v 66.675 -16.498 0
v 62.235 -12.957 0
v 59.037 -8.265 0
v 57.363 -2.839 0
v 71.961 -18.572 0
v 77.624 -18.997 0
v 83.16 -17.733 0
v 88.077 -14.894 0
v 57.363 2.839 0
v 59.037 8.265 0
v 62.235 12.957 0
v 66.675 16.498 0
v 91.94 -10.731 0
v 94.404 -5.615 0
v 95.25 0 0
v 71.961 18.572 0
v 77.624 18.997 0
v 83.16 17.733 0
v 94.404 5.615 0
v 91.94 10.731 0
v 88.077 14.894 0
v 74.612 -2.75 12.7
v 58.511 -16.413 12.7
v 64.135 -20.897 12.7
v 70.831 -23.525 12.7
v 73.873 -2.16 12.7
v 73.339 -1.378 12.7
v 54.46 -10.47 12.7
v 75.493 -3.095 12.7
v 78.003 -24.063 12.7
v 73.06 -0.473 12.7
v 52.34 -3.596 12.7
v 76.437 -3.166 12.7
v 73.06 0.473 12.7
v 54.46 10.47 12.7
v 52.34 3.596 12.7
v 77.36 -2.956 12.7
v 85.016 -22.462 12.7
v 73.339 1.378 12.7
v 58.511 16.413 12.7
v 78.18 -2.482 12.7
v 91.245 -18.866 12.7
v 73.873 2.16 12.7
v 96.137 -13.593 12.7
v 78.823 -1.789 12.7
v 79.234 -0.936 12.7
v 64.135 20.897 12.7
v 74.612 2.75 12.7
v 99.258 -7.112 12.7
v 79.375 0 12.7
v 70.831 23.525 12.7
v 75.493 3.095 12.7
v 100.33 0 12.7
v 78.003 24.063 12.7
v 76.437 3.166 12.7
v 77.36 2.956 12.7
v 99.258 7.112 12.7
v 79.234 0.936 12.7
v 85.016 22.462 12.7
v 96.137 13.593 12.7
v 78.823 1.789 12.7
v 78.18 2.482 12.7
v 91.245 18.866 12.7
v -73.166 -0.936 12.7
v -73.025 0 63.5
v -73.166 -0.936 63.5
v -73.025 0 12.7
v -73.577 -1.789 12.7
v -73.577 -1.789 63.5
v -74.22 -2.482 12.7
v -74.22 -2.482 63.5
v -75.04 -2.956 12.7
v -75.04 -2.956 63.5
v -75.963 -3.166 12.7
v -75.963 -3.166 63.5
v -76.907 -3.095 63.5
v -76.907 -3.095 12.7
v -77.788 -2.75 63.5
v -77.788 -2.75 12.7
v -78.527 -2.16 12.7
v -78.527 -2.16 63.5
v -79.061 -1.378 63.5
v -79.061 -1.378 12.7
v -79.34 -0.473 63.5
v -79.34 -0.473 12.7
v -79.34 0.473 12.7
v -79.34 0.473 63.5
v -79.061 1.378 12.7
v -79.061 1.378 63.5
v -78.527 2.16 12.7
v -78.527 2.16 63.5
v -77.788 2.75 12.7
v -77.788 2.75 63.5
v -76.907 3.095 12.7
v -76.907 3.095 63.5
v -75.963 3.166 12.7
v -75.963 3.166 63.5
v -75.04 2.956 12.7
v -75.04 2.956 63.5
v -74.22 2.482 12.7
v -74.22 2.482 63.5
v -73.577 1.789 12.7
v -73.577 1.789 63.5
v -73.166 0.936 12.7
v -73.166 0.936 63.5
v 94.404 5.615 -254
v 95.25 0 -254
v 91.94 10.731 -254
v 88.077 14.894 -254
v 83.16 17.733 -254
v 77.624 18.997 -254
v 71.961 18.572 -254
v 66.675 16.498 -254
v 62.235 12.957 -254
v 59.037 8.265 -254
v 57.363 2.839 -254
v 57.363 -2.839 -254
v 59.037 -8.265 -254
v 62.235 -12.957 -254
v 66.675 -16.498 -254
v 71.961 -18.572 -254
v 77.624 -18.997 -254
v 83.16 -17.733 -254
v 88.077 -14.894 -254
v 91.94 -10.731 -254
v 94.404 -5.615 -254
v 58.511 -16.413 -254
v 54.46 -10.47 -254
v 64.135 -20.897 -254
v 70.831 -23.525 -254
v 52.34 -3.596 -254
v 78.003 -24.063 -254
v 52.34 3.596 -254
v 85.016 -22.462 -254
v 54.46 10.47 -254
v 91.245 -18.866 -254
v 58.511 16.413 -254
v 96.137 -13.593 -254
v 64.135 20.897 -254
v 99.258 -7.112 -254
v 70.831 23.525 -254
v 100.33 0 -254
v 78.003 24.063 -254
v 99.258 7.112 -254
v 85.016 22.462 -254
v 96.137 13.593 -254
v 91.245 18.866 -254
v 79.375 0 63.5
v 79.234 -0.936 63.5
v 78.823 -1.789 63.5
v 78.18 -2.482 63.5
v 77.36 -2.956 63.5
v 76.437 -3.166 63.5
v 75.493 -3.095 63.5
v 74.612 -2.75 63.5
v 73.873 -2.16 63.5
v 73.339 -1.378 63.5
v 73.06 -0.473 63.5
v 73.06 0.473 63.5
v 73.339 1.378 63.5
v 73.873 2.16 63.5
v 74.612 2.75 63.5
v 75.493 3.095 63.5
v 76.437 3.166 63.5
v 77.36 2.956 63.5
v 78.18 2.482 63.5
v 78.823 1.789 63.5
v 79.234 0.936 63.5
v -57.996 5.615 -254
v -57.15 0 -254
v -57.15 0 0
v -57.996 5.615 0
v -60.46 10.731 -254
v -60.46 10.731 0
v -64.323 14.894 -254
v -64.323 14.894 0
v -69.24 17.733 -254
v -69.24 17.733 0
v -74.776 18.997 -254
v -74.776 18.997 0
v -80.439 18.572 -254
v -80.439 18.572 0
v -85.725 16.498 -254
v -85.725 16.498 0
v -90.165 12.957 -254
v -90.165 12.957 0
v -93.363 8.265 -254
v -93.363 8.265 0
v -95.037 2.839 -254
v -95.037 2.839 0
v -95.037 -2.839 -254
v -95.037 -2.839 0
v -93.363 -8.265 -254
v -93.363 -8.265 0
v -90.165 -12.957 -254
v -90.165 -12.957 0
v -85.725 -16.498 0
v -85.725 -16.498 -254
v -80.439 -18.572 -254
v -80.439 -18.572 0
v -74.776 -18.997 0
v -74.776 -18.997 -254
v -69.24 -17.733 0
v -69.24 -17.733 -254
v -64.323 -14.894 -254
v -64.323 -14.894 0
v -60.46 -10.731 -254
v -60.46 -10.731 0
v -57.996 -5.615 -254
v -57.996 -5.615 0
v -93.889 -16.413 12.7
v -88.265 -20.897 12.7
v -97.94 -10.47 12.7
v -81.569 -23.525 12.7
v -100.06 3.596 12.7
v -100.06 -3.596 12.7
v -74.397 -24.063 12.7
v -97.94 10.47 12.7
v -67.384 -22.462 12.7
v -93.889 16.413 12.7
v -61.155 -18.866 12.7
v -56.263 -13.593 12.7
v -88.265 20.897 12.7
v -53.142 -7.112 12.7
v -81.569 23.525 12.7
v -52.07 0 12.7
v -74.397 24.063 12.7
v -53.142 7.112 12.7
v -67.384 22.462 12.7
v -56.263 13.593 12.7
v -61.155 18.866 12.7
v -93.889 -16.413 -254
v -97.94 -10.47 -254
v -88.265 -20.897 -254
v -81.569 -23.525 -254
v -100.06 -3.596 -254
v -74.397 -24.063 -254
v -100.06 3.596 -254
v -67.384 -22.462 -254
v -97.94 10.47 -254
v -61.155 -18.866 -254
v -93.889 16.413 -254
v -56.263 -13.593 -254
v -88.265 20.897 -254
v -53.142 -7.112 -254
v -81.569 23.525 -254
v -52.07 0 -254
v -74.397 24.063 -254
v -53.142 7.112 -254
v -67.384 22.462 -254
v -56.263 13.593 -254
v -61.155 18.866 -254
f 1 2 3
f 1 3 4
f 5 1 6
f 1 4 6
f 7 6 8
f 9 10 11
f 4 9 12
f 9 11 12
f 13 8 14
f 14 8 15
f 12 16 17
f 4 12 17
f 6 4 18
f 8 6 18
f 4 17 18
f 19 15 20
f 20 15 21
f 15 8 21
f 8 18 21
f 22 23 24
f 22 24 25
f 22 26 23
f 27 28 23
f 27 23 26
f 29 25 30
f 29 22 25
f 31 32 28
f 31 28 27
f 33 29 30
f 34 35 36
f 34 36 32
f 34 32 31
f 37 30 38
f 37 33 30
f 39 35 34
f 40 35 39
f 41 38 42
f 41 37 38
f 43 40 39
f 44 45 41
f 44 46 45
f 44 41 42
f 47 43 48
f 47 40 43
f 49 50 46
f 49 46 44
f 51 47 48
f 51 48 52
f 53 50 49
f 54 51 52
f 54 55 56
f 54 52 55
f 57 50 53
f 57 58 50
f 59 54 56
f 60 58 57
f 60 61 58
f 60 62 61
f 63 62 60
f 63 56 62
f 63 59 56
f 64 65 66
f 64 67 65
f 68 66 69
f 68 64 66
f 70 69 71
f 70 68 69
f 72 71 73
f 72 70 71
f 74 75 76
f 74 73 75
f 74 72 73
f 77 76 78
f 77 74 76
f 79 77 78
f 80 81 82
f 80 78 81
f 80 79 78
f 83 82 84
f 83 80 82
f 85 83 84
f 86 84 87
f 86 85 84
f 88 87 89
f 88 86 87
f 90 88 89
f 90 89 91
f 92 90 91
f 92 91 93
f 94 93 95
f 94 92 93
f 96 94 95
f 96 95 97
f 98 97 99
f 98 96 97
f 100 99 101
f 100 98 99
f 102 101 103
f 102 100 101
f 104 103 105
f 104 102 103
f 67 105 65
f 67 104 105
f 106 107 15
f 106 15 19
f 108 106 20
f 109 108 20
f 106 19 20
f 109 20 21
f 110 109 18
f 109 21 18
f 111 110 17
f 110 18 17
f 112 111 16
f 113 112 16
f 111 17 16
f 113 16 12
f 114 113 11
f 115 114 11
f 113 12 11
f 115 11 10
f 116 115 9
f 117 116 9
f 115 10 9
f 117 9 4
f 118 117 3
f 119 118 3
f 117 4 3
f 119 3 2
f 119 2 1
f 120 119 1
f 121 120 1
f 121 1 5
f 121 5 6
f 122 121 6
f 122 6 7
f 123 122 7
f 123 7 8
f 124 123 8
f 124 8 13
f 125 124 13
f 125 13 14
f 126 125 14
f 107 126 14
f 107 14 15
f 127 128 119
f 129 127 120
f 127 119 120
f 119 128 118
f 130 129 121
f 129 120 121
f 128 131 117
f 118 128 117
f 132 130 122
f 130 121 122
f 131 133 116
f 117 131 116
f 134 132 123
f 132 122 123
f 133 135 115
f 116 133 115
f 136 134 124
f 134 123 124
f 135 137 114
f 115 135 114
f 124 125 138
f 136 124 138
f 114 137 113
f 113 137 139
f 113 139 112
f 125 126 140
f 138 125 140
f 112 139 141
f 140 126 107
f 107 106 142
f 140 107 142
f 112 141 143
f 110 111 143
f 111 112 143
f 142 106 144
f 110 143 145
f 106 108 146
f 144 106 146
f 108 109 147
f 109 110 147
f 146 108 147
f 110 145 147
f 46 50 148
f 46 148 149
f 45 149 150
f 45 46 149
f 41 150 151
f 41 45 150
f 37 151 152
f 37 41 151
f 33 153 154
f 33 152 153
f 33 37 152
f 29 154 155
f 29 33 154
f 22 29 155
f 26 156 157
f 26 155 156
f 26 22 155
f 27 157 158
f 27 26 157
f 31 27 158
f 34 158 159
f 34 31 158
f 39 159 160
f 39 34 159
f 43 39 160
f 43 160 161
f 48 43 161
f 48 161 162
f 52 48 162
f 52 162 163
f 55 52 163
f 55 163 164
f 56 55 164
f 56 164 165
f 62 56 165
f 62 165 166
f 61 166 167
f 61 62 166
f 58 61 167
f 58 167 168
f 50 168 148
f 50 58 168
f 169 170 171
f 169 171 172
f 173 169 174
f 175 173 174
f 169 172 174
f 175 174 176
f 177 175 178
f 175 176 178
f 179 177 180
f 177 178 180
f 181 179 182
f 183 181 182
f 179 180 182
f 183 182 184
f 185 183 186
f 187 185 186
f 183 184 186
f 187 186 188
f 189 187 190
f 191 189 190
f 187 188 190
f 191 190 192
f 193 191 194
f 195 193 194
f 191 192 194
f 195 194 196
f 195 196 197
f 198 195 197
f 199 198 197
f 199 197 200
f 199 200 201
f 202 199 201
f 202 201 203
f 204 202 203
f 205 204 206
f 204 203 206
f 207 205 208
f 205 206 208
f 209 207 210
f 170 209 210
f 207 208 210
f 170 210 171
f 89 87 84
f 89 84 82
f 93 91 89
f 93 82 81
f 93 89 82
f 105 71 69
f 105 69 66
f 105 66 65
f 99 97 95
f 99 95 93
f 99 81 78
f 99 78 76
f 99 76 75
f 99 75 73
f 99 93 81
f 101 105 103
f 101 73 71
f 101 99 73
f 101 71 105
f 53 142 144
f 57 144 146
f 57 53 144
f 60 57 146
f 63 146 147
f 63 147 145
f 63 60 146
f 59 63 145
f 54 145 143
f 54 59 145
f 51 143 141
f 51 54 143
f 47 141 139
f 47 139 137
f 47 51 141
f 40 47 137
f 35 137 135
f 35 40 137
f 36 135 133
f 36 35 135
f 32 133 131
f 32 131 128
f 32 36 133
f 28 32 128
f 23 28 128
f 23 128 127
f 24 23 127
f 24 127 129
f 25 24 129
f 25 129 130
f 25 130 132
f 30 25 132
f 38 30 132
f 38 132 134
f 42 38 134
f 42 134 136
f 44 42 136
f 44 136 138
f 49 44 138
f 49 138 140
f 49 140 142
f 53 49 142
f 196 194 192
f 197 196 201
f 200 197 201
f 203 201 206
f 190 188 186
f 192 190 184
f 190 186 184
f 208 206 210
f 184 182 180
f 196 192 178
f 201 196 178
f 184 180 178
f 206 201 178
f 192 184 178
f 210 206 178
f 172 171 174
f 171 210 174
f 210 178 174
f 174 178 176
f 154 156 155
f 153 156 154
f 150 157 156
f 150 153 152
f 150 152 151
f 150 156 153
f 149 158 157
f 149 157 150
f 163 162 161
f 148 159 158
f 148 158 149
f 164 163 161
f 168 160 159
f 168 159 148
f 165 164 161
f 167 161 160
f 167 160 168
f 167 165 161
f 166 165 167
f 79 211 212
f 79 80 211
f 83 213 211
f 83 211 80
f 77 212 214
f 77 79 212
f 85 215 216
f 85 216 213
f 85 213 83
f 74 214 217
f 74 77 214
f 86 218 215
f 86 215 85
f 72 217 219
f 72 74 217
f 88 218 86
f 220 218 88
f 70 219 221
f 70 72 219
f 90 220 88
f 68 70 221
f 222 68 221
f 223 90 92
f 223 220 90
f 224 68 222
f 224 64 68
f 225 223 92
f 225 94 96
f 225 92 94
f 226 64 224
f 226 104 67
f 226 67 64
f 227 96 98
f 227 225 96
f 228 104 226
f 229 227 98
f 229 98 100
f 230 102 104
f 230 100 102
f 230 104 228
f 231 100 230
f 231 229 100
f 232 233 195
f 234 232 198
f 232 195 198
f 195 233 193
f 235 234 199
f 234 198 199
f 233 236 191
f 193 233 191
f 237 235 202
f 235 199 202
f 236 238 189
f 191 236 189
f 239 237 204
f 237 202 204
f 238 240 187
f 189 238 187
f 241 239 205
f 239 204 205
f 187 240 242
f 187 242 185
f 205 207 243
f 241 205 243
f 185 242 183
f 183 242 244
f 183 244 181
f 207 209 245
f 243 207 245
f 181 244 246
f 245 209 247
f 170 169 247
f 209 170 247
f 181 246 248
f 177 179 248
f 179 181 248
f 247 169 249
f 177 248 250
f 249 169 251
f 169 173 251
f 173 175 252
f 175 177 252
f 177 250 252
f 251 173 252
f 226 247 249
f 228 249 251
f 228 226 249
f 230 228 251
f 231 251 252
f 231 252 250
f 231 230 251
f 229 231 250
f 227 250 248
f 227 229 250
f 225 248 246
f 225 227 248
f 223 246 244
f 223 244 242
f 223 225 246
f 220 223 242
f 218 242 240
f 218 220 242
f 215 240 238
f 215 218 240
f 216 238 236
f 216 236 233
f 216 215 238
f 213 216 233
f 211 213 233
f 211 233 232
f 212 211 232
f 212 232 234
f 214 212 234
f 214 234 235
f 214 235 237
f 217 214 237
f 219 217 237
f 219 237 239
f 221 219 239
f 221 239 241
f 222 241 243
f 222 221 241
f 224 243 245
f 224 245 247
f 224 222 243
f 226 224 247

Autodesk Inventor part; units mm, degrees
ref_plane "YZ Plane" through (0, 0, 0) normal (1, 0, 0) x (0, 1, 0)
ref_plane "XZ Plane" through (0, 0, 0) normal (0, 1, 0) x (-1, 0, 0)
ref_plane "XY Plane" through (0, 0, 0) normal (0, 0, 1) x (1, 0, 0)
sketch "Sketch1" plane through (0, 0, 0) normal (0, 0, 1) x (1, 0, 0)
  circle A0 centre (-76.2, 0) radius 19.05
  circle A1 centre (-76.2, 0) radius 24.13
  line L0 (0, 0) -> (0, 45.2549) construction
  circle A2 centre (76.2, 0) radius 19.05
  circle A3 centre (76.2, 0) radius 24.13
  dimension "d0" = 38.1
  dimension "d1" = 76.2
  dimension "d2" = 48.26
extrude "Extrusion1" add sketch "Sketch1" against normal blind 254
sketch "Sketch2" plane through (-76.2, 0, 0) normal (0, 0, 1) x (1, 0, 0)
  circle A0 centre (0, 0) radius 24.13
  circle A1 centre (152.4, 0) radius 19.05 projected
  circle A2 centre (152.4, 0) radius 24.13
  point P0 (76.2, 0)
extrude "Extrusion3" add sketch "Sketch2" along normal blind 12.7 contours A0 | A1 | A2
sketch "Sketch3" plane through (-76.2, 0, 12.7) normal (0, 0, 1) x (1, 0, 0)
  circle A0 centre (0, 0) radius 3.175
  circle A1 centre (152.4, 0) radius 19.05 projected
  circle A2 centre (152.4, 0) radius 3.175
  point P0 (76.2, 0)
  dimension "d9" = 6.35
  dimension "d10" = 6.35
extrude "Extrusion4" add sketch "Sketch3" along normal blind 50.8 contours A0 | A2
properties part number "endOfArm"
